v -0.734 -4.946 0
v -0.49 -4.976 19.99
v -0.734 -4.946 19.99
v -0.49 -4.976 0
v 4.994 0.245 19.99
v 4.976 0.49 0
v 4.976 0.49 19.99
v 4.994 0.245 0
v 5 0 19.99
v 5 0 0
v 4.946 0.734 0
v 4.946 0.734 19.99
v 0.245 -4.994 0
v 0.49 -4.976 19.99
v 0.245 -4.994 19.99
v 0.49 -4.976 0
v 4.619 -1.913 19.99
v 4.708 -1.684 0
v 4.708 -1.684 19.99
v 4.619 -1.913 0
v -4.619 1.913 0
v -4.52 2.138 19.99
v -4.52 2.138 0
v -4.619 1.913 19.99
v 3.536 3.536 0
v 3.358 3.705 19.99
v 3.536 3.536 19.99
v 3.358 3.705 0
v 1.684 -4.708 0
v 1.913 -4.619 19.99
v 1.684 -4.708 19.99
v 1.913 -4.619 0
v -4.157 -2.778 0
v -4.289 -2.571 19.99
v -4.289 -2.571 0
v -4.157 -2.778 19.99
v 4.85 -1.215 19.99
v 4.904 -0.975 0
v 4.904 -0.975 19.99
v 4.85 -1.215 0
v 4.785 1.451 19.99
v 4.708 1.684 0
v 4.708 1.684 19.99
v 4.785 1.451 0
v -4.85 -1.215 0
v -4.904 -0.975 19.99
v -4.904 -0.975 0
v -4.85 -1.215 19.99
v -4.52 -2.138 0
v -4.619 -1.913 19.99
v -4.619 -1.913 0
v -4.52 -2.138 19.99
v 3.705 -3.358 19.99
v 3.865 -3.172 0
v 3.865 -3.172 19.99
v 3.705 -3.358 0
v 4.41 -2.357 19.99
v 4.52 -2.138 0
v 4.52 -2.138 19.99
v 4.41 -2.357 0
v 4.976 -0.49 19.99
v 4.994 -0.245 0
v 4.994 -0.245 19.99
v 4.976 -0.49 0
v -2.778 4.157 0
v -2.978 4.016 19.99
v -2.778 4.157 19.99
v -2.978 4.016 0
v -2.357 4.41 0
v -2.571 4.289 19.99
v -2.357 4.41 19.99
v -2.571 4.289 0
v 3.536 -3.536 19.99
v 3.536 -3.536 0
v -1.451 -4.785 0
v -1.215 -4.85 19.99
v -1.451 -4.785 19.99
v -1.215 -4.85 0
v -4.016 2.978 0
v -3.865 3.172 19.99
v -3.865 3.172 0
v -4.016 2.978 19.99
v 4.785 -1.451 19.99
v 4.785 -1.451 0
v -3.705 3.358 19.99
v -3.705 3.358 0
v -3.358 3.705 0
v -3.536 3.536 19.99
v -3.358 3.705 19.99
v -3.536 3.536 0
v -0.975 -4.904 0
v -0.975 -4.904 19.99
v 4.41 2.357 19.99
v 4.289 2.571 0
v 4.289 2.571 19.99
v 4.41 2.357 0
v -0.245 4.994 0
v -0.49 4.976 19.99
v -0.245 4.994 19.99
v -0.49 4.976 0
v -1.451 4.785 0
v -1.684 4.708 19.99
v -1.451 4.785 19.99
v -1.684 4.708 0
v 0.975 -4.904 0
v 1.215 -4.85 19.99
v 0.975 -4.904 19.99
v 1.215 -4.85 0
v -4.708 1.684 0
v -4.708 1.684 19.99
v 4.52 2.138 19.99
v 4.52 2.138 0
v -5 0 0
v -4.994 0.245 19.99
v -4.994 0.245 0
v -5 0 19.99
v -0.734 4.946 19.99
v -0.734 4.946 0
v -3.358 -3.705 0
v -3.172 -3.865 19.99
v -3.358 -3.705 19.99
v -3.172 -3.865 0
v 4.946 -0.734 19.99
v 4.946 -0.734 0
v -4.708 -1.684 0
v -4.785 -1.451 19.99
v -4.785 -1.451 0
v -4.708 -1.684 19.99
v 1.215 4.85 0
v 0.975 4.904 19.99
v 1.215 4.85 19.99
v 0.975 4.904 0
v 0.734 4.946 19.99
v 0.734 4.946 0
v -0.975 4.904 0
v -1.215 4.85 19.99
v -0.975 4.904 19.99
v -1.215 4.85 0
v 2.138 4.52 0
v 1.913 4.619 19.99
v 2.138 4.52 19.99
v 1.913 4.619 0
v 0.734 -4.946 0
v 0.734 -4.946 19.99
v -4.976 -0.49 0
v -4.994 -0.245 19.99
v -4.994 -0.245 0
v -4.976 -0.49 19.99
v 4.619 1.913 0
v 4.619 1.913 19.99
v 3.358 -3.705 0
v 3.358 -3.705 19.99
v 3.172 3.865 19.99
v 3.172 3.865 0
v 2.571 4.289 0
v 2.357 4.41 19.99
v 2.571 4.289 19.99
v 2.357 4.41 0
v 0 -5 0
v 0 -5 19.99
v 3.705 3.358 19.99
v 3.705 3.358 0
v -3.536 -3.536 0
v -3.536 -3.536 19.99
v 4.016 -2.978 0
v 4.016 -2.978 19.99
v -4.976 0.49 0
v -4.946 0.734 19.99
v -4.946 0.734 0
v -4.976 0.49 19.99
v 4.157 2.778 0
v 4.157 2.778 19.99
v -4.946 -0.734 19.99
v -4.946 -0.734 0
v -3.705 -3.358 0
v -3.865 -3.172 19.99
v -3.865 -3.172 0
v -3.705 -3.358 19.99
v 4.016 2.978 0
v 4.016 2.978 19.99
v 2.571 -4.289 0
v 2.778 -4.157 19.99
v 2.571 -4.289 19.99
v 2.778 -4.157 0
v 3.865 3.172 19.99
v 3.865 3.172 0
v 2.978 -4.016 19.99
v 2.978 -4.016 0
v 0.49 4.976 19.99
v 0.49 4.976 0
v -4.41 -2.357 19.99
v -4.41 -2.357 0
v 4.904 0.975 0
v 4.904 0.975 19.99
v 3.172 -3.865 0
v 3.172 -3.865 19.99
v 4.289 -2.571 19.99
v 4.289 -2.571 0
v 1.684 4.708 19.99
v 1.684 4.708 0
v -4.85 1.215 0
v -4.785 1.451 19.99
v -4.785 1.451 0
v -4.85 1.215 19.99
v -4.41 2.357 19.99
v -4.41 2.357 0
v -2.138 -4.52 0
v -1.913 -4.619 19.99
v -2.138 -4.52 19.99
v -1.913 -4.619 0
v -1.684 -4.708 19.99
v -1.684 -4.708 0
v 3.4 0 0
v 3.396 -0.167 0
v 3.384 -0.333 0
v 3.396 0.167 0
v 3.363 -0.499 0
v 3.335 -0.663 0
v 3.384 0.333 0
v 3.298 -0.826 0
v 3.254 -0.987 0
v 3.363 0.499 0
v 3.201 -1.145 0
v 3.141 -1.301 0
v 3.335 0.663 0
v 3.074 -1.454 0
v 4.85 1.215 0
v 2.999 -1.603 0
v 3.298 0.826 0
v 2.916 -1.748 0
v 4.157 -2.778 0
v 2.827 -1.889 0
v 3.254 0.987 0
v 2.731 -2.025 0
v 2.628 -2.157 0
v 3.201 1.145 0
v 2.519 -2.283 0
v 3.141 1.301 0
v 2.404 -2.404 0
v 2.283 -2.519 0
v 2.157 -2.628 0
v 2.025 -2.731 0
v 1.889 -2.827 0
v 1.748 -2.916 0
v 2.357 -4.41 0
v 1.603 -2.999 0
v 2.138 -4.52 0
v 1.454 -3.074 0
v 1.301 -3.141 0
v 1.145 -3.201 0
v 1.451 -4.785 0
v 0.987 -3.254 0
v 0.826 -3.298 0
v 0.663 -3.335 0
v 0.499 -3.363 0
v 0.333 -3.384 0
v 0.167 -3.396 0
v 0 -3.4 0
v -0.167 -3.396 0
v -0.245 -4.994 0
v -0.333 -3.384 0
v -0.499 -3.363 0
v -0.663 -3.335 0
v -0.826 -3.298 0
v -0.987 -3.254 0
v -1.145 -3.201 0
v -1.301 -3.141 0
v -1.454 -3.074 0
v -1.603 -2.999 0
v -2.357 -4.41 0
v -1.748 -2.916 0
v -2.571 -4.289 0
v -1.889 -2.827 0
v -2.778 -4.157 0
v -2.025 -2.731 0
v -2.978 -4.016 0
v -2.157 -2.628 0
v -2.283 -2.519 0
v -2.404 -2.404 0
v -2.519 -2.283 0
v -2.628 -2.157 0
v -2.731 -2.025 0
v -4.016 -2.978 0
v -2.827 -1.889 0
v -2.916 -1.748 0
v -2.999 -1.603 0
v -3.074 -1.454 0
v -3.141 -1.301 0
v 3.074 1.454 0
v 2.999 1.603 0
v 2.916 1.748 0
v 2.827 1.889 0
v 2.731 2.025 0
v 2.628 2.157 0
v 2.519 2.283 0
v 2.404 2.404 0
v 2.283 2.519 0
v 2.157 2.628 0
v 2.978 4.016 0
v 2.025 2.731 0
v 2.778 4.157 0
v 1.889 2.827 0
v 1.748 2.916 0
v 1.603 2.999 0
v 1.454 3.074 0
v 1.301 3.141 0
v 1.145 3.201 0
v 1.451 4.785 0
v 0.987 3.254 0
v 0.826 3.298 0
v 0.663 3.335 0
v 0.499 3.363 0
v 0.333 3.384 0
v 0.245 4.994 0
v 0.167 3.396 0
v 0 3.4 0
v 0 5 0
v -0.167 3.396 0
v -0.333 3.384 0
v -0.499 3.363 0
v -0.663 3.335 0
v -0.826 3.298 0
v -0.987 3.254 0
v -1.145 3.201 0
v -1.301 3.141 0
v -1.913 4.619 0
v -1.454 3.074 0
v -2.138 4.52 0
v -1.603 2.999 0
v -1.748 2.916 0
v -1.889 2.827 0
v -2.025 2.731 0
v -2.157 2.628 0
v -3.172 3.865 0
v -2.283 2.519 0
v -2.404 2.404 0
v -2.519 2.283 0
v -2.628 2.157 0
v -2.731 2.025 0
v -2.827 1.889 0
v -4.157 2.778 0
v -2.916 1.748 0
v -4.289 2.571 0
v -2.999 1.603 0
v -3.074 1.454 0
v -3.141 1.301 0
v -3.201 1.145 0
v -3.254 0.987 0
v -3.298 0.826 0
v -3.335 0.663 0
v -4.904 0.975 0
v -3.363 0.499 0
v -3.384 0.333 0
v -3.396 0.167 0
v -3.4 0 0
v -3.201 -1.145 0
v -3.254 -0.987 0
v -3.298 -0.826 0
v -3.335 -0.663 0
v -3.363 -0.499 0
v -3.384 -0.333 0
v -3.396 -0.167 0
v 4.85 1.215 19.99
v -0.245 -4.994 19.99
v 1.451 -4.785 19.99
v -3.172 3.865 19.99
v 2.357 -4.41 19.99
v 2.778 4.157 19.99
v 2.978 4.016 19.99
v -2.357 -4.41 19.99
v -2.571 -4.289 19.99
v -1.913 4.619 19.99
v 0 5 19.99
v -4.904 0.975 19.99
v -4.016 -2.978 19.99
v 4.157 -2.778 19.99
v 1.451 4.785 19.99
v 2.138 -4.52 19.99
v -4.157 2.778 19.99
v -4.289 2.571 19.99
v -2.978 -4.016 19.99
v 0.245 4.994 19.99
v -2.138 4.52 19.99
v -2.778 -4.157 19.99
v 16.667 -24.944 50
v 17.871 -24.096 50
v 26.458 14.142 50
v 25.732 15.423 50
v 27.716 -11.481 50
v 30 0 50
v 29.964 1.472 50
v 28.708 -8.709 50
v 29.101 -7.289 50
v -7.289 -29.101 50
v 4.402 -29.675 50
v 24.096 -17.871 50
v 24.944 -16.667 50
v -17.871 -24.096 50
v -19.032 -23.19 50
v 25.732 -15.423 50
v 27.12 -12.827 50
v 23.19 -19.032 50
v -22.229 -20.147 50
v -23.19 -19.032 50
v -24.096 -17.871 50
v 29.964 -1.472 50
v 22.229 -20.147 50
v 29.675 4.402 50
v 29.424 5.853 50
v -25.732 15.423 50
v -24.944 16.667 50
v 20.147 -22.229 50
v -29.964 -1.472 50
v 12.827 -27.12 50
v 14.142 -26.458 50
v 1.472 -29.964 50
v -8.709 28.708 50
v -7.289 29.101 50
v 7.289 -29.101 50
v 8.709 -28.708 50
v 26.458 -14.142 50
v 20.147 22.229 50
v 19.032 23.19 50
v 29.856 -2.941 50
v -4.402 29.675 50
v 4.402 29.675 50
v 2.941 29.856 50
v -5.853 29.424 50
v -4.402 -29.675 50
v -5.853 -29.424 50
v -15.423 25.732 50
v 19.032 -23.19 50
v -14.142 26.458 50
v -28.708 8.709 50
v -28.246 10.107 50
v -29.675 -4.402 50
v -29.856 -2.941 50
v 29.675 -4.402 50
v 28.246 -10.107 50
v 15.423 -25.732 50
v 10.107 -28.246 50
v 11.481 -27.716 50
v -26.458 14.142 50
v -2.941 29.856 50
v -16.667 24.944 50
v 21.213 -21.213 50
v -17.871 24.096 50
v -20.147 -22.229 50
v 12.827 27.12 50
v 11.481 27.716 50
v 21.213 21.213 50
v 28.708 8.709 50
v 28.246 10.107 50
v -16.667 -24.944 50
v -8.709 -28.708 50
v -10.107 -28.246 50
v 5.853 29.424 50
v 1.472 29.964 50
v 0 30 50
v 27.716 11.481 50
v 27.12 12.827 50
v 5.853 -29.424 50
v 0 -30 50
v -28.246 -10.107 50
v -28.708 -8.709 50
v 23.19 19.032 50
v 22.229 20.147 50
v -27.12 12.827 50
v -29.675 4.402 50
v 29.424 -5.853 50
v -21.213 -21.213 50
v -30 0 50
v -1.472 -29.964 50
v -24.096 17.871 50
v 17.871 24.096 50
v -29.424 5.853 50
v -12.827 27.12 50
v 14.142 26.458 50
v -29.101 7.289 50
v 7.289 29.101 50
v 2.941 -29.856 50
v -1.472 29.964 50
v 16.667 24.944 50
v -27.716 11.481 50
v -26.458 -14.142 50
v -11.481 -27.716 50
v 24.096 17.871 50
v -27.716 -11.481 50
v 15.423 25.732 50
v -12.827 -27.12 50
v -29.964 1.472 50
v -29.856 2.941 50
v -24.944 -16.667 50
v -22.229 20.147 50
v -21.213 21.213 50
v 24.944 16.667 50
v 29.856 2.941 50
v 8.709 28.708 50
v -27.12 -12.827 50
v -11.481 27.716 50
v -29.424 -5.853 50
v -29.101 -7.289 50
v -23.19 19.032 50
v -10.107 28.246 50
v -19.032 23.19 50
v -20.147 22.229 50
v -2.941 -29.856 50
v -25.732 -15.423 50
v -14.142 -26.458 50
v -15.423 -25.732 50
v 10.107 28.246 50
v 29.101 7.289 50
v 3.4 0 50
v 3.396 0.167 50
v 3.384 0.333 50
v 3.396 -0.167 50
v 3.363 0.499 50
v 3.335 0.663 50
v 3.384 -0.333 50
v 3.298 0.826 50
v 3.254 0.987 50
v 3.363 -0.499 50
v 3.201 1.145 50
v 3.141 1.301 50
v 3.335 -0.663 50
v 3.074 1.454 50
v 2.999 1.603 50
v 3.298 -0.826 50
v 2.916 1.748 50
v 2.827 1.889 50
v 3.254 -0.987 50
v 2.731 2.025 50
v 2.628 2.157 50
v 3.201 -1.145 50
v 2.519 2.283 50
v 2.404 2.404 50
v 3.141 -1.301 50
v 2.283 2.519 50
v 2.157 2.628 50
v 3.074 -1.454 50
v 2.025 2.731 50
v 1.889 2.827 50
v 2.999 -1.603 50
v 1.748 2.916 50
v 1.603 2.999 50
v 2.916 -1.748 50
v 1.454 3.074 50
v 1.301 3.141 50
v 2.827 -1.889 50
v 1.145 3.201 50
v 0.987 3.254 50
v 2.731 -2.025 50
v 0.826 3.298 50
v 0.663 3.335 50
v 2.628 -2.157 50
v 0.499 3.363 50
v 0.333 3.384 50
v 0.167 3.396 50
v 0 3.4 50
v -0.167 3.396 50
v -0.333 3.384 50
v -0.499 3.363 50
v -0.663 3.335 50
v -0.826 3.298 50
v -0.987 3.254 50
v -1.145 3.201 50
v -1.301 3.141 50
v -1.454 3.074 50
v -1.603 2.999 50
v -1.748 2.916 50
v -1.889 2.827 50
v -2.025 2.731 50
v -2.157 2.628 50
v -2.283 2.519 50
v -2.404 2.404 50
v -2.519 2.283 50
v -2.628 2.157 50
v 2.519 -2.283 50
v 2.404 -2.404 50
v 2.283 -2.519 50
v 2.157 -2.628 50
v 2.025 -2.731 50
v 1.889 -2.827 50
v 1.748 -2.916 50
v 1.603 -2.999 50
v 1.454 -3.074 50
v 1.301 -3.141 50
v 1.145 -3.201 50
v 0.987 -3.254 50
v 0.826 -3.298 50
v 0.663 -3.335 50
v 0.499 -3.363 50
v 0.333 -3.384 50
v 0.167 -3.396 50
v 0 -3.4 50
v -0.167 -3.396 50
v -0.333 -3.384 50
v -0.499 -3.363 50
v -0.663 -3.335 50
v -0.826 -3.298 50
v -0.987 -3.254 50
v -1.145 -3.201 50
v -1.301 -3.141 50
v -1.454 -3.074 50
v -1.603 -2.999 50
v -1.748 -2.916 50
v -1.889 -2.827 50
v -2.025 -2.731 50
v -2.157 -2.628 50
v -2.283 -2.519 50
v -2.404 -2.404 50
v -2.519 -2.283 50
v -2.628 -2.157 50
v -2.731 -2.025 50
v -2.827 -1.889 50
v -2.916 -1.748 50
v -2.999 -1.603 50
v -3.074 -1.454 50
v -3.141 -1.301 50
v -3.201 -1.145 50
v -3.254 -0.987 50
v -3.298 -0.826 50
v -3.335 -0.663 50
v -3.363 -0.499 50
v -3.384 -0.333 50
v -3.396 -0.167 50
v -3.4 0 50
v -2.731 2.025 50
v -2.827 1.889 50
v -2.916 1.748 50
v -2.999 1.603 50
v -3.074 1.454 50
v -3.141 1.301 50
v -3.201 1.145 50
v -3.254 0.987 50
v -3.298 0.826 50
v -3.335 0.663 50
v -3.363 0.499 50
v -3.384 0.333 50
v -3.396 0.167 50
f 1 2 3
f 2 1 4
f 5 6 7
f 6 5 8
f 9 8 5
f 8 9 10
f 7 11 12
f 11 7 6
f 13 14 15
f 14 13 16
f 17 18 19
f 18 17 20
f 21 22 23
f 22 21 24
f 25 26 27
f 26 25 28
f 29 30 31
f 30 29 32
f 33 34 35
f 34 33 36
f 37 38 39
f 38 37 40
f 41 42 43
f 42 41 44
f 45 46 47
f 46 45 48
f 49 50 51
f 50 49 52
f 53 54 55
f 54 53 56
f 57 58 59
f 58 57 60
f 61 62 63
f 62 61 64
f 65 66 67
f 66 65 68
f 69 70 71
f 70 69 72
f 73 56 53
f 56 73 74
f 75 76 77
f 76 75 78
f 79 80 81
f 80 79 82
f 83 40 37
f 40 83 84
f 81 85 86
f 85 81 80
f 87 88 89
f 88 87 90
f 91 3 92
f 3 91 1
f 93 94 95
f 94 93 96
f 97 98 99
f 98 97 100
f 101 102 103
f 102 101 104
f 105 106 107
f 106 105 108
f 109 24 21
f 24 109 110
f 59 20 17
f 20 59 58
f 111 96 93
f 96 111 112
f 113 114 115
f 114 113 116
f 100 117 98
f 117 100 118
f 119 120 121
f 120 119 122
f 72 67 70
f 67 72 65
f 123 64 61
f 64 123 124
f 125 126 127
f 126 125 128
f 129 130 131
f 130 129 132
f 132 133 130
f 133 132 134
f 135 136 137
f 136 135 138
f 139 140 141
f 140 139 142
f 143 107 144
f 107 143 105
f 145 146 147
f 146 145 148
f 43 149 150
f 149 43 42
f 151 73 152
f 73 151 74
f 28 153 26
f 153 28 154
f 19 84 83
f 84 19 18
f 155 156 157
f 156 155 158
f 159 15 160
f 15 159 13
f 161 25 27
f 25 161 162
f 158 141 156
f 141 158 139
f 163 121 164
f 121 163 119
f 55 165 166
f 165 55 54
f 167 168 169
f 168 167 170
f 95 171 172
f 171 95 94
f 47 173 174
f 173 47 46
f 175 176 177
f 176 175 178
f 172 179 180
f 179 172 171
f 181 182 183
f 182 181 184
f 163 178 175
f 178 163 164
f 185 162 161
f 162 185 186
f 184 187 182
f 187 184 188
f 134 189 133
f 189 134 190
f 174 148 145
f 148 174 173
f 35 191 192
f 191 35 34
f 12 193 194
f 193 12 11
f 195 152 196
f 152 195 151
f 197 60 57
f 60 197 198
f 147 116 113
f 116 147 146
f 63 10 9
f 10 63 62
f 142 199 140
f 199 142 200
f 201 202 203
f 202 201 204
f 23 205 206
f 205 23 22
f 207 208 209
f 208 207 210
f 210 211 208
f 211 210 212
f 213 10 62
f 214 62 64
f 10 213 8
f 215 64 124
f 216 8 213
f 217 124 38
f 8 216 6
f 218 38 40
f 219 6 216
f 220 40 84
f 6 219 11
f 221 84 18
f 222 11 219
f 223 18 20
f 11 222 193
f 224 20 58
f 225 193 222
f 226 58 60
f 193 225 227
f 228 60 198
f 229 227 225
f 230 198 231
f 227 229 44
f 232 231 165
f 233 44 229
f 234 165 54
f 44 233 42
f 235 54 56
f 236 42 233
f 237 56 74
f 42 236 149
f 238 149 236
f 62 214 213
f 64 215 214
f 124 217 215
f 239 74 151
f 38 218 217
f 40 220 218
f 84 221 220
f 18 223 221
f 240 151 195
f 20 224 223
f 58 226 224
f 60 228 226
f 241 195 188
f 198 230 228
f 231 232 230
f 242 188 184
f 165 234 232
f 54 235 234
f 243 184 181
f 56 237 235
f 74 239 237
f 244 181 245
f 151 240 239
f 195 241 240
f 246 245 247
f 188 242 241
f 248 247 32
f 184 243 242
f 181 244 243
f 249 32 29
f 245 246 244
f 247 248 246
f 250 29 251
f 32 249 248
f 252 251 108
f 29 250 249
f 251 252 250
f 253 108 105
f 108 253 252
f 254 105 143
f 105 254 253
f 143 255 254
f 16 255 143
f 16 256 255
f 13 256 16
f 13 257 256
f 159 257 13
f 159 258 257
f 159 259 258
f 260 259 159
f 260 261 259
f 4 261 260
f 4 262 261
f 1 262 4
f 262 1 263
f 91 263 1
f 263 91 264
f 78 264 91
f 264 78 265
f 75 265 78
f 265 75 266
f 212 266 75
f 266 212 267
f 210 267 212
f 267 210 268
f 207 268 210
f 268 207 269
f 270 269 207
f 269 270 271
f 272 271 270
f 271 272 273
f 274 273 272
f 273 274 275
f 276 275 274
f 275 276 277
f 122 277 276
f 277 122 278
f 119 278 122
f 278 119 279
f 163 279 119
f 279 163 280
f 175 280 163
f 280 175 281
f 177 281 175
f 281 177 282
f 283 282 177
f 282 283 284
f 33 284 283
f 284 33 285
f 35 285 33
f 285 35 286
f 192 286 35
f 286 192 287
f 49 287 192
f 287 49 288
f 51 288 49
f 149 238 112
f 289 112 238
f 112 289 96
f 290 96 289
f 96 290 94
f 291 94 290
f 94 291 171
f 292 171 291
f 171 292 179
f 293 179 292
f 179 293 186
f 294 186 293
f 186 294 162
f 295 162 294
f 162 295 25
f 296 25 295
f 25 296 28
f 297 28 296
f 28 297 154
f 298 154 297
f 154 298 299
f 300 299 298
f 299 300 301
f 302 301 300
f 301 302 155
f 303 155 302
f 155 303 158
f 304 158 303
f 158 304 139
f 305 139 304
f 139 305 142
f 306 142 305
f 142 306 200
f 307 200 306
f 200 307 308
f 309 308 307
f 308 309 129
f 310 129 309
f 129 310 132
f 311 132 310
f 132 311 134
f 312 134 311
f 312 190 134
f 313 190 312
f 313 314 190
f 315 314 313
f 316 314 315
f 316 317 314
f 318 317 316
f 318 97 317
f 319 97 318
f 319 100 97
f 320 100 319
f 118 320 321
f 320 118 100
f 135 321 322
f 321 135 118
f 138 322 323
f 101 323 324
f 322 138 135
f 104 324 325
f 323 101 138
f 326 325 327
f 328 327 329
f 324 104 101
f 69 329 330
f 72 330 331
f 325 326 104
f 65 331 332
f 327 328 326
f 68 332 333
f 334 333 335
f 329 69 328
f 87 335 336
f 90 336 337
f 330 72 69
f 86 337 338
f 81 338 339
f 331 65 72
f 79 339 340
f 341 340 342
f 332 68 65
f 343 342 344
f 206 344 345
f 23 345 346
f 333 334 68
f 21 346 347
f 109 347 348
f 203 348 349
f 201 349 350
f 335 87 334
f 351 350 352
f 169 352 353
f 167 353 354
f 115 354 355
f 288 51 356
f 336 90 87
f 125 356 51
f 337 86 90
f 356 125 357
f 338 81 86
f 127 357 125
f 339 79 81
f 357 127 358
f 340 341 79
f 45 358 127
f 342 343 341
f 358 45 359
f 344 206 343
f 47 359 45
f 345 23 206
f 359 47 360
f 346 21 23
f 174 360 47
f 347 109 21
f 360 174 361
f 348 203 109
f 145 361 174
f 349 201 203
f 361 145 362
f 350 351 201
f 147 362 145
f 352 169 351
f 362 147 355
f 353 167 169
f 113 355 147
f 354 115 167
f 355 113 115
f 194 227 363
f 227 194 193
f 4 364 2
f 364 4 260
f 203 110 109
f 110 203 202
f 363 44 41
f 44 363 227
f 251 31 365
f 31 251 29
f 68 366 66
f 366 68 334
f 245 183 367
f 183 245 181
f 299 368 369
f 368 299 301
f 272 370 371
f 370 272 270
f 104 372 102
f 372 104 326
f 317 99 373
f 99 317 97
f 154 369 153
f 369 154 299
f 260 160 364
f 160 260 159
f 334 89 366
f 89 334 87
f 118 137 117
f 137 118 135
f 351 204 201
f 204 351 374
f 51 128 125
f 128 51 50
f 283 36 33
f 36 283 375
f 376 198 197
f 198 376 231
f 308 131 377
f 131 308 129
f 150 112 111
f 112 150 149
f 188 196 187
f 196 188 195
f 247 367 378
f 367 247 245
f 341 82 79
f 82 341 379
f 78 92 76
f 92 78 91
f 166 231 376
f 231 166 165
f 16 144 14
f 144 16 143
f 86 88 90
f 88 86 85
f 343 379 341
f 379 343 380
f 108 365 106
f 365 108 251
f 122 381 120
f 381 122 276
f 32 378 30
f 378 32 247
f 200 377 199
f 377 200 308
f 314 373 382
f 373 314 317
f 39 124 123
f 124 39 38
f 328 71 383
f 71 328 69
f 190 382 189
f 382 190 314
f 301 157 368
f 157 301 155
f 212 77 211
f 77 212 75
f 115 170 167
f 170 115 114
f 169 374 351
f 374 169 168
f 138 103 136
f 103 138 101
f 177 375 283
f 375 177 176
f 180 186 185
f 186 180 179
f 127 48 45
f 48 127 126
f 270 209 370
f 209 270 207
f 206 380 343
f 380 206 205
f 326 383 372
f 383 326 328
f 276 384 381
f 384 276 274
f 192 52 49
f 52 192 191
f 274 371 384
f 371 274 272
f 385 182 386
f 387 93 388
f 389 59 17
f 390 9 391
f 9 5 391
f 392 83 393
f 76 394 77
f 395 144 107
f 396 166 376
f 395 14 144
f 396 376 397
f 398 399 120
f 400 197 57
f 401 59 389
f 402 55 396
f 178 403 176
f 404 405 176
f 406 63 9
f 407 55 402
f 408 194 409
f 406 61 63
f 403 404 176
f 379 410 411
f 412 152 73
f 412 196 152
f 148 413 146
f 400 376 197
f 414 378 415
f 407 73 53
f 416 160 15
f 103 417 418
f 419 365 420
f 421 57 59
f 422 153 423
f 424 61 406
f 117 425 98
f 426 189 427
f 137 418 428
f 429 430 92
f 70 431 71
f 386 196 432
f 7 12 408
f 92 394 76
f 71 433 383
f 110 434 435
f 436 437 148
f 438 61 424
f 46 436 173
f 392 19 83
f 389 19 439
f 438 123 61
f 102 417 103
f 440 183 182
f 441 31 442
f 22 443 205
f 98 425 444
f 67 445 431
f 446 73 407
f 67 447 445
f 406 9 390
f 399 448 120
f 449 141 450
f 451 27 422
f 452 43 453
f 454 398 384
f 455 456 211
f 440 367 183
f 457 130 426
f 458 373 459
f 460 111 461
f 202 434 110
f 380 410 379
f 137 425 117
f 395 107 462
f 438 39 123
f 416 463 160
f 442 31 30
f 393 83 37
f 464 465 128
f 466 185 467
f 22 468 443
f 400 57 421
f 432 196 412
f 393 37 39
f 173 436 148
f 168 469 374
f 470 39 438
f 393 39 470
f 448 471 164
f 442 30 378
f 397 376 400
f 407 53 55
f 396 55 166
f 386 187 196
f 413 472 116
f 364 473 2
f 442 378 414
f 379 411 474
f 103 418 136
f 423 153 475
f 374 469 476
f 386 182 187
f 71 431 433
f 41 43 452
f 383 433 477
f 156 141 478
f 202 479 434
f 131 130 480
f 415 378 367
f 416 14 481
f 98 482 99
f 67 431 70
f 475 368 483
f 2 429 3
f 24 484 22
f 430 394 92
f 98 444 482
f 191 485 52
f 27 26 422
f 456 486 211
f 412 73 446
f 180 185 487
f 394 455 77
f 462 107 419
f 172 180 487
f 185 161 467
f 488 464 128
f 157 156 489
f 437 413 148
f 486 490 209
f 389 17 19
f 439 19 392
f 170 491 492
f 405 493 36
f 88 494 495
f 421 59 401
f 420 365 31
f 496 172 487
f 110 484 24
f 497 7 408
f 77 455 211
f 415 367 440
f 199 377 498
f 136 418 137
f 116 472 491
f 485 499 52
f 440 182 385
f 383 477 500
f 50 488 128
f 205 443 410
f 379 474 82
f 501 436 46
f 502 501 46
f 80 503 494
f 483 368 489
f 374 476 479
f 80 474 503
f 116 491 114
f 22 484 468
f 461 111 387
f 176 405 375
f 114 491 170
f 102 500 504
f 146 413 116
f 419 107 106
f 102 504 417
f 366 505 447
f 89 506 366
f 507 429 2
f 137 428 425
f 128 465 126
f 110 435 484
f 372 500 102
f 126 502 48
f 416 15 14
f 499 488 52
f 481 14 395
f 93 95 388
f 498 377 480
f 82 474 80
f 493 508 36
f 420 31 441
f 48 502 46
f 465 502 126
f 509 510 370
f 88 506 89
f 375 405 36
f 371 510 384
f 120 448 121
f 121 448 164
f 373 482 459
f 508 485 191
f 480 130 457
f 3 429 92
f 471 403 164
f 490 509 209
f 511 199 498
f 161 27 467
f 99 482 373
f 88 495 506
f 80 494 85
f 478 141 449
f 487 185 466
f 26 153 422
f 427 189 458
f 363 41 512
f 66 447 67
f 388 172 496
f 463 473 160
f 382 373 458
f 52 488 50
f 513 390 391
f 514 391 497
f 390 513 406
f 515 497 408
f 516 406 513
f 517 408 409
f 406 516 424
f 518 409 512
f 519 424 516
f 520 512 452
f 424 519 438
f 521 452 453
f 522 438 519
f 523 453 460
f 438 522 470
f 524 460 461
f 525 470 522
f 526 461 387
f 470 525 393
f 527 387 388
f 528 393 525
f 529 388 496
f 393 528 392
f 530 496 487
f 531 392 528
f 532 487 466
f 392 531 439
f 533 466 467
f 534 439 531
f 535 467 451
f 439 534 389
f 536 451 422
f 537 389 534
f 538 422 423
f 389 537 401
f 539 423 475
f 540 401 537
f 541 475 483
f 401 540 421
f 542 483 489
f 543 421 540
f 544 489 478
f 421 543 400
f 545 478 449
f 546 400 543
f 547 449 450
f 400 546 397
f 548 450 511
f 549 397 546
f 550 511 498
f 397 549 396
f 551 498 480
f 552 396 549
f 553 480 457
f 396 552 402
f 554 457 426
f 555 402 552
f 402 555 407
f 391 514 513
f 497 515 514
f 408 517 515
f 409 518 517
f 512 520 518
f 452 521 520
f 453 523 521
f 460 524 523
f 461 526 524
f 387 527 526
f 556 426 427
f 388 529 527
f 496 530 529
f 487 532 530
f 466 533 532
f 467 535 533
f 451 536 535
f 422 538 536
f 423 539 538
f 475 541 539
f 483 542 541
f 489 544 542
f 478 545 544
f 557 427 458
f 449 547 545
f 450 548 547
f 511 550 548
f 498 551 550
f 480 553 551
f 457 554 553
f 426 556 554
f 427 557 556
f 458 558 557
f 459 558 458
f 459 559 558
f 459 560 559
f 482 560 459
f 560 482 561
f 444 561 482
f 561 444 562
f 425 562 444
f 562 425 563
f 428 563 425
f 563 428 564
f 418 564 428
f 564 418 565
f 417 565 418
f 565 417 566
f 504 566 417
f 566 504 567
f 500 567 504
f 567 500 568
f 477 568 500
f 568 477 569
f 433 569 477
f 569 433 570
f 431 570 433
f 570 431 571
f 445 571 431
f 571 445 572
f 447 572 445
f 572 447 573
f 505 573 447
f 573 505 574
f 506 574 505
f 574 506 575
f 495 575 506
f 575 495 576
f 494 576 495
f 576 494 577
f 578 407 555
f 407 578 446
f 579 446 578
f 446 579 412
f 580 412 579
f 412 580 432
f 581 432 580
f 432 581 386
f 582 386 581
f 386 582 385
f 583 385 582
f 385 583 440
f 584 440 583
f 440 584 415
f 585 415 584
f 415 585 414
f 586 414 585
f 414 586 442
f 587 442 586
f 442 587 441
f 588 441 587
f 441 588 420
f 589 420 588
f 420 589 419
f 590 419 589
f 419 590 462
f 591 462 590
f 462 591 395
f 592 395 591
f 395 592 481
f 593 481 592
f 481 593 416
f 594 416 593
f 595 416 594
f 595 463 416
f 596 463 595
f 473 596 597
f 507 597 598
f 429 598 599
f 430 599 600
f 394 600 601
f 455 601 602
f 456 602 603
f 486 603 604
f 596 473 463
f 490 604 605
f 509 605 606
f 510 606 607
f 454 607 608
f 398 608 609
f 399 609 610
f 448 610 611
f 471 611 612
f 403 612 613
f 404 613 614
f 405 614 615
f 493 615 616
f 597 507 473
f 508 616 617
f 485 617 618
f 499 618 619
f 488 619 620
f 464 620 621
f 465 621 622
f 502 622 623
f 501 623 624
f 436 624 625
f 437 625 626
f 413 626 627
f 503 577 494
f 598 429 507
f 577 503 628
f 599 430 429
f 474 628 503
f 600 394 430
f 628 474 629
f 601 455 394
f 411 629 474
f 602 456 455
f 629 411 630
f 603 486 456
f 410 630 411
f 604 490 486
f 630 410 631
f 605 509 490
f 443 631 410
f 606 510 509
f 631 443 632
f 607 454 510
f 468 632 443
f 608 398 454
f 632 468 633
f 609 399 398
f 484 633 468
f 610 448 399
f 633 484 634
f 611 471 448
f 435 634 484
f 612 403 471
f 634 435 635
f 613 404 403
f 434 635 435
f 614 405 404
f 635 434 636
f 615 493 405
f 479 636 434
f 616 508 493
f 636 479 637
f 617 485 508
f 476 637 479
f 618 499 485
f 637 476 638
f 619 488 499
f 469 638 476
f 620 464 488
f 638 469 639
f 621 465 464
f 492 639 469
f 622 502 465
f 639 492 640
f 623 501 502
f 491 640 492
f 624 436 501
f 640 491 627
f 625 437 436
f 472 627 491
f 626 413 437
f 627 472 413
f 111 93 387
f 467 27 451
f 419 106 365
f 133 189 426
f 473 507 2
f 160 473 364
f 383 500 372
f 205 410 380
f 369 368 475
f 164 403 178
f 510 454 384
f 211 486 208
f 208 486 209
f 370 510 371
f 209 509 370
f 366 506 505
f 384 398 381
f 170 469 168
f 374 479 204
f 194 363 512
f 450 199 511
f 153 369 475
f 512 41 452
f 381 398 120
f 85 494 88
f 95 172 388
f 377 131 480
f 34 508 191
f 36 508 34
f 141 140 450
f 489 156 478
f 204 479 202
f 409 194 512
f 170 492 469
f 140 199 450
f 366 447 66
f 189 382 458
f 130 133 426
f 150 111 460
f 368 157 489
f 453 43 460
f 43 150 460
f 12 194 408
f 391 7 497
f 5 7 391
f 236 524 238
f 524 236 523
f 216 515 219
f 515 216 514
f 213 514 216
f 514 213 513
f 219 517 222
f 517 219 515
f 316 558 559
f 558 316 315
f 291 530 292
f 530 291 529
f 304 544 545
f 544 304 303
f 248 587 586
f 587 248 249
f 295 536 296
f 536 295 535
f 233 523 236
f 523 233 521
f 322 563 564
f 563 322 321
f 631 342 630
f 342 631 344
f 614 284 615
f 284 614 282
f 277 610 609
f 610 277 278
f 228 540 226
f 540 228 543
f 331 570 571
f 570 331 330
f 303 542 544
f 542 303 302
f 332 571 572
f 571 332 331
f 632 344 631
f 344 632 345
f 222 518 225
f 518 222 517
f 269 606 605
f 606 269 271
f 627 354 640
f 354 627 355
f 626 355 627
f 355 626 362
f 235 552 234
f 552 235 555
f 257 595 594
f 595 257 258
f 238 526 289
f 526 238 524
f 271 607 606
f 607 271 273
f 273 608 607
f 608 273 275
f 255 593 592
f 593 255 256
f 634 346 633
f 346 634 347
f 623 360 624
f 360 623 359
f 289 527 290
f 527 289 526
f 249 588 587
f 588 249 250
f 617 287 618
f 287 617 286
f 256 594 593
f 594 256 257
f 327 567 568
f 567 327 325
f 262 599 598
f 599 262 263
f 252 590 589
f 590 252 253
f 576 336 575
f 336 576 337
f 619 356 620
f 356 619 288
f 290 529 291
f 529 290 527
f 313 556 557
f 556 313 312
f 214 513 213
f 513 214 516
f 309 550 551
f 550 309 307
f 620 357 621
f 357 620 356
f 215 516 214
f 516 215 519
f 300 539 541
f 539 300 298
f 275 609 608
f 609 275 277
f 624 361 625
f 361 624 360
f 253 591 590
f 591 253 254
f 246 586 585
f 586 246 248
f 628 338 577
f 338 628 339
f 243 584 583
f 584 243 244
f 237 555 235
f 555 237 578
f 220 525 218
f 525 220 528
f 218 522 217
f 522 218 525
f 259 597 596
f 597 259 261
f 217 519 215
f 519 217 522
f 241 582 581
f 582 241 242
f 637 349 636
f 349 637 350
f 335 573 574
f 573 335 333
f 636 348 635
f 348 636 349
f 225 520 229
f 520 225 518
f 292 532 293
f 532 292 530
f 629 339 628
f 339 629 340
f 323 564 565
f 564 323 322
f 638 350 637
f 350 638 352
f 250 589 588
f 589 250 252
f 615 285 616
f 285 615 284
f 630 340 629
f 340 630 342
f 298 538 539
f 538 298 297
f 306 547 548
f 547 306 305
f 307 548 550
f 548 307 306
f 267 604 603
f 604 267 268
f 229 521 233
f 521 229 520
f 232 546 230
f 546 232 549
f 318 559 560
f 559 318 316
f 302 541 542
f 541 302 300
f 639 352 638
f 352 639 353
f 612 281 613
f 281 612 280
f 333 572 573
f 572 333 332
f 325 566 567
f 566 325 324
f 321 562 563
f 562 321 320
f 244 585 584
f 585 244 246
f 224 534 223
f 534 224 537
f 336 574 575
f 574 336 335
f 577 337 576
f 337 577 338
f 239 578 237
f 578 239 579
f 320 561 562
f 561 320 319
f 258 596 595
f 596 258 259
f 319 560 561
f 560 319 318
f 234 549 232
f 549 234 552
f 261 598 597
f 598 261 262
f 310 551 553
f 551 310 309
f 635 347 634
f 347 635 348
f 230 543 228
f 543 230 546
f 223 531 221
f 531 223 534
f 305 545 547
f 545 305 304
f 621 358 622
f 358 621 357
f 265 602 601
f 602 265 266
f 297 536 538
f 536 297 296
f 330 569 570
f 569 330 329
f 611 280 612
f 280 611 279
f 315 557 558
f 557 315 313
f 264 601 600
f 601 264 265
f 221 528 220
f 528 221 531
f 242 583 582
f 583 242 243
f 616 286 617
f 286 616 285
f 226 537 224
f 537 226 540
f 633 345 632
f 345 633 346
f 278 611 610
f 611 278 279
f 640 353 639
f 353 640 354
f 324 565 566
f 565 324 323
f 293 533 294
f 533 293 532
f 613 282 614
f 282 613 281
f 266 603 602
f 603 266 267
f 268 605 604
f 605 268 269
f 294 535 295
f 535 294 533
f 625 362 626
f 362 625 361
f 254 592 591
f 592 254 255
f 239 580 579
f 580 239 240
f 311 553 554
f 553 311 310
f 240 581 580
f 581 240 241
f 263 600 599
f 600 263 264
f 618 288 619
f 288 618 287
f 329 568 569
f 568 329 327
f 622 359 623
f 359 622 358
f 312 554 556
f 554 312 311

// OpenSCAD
// Small lab funnel, printed upright: spout at the bottom, wide opening at the top
// All dimensions in mm

$fn = 128;

// ---- Spout ----
spout_od      = 10;    // spout outer diameter
spout_id      = spout_od - 2 * 1.6;   // spout bore = 6.8 mm
spout_h       = 20;    // spout height (z = 0 to 20)

// ---- Cone ----
cone_od_top   = 60;    // cone outer diameter at the rim (z = 50)
cone_od_base  = spout_od;              // cone outer diameter where it meets the spout (z = 20)
cone_h        = 50 - 20;               // cone height = 30 mm

// ---- Wall ----
wall          = 1.6;   // uniform wall thickness

// ---- Model ----
difference() {
    union() {
        // Spout tube
        translate([0, 0, 0])
            cylinder(d = spout_od, h = spout_h);
        // Cone (overlaps slightly into the spout for a clean union)
        translate([0, 0, spout_h - 0.01])
            cylinder(d1 = cone_od_base, d2 = cone_od_top, h = cone_h + 0.01);
    }
    // Through-bore from the bottom up past the rim
    translate([0, 0, -1])
        cylinder(d = spout_id, h = spout_h + cone_h + 2);
}
